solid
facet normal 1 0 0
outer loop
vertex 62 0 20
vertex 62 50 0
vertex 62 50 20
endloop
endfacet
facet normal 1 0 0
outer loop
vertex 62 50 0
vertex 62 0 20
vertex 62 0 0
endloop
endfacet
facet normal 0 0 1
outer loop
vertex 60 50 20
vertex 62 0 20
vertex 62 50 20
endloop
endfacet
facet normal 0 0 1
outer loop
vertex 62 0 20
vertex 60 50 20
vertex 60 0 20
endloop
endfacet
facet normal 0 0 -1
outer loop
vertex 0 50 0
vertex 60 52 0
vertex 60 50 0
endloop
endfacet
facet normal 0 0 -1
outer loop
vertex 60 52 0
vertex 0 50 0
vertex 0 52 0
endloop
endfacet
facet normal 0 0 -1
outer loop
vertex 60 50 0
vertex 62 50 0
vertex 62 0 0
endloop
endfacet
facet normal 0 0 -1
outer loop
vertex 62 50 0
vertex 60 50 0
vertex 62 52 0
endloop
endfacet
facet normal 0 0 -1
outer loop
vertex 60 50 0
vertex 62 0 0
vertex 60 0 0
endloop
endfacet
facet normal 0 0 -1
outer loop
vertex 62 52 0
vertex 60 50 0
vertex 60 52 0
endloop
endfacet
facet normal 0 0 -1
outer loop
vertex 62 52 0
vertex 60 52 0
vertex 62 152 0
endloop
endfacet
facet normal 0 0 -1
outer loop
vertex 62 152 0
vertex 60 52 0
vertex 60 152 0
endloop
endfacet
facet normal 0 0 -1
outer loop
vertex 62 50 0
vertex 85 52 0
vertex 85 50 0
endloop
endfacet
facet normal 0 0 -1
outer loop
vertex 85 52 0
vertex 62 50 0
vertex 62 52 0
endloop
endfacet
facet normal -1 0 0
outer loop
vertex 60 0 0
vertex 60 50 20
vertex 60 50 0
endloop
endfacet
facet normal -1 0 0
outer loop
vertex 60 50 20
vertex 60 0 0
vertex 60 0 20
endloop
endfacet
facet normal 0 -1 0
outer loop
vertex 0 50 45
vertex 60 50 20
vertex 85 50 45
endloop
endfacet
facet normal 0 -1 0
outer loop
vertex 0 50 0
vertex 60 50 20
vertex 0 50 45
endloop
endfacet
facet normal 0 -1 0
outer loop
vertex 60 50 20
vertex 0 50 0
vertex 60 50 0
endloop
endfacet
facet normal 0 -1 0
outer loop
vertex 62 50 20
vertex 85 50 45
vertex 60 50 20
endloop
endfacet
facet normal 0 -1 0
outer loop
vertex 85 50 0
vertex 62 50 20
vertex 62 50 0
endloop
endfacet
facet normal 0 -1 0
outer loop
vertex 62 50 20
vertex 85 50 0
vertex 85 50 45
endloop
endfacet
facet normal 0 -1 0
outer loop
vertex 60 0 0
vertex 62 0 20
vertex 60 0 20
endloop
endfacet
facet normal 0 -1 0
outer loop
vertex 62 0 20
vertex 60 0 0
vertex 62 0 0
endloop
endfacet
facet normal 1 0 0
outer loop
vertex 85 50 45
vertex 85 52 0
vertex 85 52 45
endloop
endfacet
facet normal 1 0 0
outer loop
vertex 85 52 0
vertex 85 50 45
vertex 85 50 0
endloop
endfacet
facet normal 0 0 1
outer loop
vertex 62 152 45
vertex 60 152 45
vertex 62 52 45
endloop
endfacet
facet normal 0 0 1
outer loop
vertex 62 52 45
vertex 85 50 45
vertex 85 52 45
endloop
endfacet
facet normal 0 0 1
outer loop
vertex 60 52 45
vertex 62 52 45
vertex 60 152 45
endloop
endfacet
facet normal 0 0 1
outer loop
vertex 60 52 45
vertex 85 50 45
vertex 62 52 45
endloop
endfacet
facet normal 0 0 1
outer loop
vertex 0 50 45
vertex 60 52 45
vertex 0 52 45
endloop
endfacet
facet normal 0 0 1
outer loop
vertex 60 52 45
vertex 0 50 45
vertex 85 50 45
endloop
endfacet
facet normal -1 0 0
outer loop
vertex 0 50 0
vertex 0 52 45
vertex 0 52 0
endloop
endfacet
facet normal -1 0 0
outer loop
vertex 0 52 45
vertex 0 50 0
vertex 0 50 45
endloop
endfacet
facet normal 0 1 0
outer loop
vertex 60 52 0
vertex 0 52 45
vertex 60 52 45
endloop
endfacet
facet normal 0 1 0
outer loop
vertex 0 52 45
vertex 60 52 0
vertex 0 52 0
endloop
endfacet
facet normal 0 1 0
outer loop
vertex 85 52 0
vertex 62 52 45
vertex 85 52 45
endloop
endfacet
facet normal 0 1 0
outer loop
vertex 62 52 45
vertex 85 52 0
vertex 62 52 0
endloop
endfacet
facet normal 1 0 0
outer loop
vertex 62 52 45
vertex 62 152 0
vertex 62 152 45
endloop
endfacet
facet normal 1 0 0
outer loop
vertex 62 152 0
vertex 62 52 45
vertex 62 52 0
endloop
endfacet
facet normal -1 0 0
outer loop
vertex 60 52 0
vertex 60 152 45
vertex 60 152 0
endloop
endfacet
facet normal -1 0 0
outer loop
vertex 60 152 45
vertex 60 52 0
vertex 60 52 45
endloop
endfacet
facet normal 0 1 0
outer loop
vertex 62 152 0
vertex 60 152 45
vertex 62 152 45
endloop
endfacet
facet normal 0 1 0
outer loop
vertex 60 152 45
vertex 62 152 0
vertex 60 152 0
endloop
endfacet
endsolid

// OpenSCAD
union() {
	//translate( [0, 0, 20] ) {
	//	cube( [85, 50, 2] );
	//}
	translate( [60, 0, 0] ) {
		cube( [2, 50, 20] );
	}
	translate( [0, 50, 0] ) {
		cube( [85, 2, 45] );
	}
	translate( [60, 52, 0] ) {
		cube( [2, 100, 45] );
	}
}
